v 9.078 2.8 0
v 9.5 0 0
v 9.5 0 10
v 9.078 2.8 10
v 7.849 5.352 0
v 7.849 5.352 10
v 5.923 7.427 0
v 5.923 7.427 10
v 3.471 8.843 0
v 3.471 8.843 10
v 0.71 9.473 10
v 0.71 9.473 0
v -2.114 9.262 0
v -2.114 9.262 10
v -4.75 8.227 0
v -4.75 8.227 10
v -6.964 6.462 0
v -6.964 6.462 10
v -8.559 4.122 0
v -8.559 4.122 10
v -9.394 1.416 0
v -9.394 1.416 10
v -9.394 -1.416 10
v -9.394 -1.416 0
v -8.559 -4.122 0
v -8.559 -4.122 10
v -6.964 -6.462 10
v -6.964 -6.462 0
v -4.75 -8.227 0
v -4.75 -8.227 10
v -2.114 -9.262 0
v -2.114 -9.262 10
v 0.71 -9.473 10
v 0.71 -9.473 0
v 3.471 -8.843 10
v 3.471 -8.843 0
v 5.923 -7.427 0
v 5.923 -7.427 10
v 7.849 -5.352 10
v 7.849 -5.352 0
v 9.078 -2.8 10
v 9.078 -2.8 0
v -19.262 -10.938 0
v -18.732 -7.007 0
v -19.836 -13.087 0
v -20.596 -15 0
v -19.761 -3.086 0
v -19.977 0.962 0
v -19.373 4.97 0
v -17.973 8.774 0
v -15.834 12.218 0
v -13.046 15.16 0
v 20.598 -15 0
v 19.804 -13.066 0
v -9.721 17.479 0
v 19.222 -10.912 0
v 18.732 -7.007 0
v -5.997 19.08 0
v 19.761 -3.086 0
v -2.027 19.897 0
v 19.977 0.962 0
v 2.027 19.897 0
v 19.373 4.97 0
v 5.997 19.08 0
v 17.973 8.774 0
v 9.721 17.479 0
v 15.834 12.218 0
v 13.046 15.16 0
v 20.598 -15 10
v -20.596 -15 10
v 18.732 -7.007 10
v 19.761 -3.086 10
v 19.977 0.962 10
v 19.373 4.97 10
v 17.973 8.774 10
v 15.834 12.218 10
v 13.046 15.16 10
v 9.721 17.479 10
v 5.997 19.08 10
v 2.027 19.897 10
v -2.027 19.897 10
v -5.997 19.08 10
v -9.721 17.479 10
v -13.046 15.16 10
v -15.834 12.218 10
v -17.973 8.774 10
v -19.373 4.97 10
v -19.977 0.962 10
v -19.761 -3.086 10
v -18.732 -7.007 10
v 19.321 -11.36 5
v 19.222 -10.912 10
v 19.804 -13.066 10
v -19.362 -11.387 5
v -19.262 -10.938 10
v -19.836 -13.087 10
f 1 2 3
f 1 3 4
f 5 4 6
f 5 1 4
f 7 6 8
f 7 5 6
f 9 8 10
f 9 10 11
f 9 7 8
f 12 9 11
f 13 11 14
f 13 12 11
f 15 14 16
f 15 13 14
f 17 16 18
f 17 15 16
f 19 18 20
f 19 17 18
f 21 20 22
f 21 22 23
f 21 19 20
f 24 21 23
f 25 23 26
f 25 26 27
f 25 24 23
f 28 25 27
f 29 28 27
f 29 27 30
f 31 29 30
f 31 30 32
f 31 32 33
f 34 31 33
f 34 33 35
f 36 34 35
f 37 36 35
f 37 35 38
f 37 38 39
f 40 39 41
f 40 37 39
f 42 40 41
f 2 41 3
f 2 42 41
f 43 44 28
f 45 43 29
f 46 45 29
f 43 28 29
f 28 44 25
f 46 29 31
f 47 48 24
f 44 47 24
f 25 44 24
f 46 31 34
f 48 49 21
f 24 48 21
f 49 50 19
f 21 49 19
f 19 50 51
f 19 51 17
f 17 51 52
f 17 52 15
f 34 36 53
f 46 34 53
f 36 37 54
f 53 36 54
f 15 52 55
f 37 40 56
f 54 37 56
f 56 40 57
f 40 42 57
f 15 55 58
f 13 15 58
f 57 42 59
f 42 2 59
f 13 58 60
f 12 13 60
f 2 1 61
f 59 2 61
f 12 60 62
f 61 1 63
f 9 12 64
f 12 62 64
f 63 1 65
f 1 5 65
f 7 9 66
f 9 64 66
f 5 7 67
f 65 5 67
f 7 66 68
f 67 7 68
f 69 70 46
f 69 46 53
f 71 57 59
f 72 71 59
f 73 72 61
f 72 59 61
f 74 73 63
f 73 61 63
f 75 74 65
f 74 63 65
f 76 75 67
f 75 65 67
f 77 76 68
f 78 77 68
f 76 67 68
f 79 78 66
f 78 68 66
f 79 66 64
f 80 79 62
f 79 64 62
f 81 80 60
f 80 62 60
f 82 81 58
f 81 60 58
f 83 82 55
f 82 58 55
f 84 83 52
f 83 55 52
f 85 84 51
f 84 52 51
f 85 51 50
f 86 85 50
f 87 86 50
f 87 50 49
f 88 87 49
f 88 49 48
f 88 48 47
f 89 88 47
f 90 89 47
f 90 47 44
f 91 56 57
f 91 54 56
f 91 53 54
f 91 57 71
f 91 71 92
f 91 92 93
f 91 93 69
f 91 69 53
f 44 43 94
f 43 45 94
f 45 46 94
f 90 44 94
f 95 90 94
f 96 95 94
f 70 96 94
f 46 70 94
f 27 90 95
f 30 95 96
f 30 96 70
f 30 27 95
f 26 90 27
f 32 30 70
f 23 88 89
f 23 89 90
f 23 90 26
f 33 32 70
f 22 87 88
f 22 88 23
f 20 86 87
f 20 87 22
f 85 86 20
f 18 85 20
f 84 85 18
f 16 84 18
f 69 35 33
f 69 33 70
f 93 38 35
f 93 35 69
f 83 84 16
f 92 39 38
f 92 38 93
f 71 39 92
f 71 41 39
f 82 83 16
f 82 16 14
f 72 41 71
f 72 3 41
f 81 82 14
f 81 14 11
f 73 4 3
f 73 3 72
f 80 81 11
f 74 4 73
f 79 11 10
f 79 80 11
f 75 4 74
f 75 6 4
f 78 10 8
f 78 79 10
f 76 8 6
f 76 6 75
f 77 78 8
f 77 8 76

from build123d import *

# Parameters (mm, degrees)
SKETCH1_R           = 9.5
BOSS_EXTRUDE1_DEPTH = 10
SKETCH2_W           = 50.0481005
SKETCH2_H           = 5
CUT_EXTRUDE1_DEPTH  = 10


with BuildPart() as part:
    # Sketch1 → Boss-Extrude1 (new body)
    with BuildSketch(Plane.XY):
        with BuildLine():
            Line((-25, -20), (25, -20))
            add(Edge.make_bspline(
                [(18.732474137, -7.006740519), (19.213565223, -16.256662958), (25, -20)],
                knots=[0, 0, 0, 0.763362407, 0.763362407, 0.763362407], degree=2))
            ThreePointArc((18.732474137, -7.006740519), (0, 20), (-18.732474137, -7.006740519))
            add(Edge.make_bspline(
                [(-18.732474137, -7.006740519), (-19.393359213, -16.636844777), (-25, -20)],
                knots=[0, 0, 0, 0.631911459, 0.631911459, 0.631911459], degree=2))
        make_face()
        Circle(SKETCH1_R, mode=Mode.SUBTRACT)
    extrude(amount=BOSS_EXTRUDE1_DEPTH)

    # Sketch2 → Cut-Extrude1 (cut)
    with BuildSketch(Plane.XY.offset(10)):
        with Locations((0.02405025, -17.5)):
            Rectangle(SKETCH2_W, SKETCH2_H)
    extrude(amount=-CUT_EXTRUDE1_DEPTH, mode=Mode.SUBTRACT)


solid = part.part
